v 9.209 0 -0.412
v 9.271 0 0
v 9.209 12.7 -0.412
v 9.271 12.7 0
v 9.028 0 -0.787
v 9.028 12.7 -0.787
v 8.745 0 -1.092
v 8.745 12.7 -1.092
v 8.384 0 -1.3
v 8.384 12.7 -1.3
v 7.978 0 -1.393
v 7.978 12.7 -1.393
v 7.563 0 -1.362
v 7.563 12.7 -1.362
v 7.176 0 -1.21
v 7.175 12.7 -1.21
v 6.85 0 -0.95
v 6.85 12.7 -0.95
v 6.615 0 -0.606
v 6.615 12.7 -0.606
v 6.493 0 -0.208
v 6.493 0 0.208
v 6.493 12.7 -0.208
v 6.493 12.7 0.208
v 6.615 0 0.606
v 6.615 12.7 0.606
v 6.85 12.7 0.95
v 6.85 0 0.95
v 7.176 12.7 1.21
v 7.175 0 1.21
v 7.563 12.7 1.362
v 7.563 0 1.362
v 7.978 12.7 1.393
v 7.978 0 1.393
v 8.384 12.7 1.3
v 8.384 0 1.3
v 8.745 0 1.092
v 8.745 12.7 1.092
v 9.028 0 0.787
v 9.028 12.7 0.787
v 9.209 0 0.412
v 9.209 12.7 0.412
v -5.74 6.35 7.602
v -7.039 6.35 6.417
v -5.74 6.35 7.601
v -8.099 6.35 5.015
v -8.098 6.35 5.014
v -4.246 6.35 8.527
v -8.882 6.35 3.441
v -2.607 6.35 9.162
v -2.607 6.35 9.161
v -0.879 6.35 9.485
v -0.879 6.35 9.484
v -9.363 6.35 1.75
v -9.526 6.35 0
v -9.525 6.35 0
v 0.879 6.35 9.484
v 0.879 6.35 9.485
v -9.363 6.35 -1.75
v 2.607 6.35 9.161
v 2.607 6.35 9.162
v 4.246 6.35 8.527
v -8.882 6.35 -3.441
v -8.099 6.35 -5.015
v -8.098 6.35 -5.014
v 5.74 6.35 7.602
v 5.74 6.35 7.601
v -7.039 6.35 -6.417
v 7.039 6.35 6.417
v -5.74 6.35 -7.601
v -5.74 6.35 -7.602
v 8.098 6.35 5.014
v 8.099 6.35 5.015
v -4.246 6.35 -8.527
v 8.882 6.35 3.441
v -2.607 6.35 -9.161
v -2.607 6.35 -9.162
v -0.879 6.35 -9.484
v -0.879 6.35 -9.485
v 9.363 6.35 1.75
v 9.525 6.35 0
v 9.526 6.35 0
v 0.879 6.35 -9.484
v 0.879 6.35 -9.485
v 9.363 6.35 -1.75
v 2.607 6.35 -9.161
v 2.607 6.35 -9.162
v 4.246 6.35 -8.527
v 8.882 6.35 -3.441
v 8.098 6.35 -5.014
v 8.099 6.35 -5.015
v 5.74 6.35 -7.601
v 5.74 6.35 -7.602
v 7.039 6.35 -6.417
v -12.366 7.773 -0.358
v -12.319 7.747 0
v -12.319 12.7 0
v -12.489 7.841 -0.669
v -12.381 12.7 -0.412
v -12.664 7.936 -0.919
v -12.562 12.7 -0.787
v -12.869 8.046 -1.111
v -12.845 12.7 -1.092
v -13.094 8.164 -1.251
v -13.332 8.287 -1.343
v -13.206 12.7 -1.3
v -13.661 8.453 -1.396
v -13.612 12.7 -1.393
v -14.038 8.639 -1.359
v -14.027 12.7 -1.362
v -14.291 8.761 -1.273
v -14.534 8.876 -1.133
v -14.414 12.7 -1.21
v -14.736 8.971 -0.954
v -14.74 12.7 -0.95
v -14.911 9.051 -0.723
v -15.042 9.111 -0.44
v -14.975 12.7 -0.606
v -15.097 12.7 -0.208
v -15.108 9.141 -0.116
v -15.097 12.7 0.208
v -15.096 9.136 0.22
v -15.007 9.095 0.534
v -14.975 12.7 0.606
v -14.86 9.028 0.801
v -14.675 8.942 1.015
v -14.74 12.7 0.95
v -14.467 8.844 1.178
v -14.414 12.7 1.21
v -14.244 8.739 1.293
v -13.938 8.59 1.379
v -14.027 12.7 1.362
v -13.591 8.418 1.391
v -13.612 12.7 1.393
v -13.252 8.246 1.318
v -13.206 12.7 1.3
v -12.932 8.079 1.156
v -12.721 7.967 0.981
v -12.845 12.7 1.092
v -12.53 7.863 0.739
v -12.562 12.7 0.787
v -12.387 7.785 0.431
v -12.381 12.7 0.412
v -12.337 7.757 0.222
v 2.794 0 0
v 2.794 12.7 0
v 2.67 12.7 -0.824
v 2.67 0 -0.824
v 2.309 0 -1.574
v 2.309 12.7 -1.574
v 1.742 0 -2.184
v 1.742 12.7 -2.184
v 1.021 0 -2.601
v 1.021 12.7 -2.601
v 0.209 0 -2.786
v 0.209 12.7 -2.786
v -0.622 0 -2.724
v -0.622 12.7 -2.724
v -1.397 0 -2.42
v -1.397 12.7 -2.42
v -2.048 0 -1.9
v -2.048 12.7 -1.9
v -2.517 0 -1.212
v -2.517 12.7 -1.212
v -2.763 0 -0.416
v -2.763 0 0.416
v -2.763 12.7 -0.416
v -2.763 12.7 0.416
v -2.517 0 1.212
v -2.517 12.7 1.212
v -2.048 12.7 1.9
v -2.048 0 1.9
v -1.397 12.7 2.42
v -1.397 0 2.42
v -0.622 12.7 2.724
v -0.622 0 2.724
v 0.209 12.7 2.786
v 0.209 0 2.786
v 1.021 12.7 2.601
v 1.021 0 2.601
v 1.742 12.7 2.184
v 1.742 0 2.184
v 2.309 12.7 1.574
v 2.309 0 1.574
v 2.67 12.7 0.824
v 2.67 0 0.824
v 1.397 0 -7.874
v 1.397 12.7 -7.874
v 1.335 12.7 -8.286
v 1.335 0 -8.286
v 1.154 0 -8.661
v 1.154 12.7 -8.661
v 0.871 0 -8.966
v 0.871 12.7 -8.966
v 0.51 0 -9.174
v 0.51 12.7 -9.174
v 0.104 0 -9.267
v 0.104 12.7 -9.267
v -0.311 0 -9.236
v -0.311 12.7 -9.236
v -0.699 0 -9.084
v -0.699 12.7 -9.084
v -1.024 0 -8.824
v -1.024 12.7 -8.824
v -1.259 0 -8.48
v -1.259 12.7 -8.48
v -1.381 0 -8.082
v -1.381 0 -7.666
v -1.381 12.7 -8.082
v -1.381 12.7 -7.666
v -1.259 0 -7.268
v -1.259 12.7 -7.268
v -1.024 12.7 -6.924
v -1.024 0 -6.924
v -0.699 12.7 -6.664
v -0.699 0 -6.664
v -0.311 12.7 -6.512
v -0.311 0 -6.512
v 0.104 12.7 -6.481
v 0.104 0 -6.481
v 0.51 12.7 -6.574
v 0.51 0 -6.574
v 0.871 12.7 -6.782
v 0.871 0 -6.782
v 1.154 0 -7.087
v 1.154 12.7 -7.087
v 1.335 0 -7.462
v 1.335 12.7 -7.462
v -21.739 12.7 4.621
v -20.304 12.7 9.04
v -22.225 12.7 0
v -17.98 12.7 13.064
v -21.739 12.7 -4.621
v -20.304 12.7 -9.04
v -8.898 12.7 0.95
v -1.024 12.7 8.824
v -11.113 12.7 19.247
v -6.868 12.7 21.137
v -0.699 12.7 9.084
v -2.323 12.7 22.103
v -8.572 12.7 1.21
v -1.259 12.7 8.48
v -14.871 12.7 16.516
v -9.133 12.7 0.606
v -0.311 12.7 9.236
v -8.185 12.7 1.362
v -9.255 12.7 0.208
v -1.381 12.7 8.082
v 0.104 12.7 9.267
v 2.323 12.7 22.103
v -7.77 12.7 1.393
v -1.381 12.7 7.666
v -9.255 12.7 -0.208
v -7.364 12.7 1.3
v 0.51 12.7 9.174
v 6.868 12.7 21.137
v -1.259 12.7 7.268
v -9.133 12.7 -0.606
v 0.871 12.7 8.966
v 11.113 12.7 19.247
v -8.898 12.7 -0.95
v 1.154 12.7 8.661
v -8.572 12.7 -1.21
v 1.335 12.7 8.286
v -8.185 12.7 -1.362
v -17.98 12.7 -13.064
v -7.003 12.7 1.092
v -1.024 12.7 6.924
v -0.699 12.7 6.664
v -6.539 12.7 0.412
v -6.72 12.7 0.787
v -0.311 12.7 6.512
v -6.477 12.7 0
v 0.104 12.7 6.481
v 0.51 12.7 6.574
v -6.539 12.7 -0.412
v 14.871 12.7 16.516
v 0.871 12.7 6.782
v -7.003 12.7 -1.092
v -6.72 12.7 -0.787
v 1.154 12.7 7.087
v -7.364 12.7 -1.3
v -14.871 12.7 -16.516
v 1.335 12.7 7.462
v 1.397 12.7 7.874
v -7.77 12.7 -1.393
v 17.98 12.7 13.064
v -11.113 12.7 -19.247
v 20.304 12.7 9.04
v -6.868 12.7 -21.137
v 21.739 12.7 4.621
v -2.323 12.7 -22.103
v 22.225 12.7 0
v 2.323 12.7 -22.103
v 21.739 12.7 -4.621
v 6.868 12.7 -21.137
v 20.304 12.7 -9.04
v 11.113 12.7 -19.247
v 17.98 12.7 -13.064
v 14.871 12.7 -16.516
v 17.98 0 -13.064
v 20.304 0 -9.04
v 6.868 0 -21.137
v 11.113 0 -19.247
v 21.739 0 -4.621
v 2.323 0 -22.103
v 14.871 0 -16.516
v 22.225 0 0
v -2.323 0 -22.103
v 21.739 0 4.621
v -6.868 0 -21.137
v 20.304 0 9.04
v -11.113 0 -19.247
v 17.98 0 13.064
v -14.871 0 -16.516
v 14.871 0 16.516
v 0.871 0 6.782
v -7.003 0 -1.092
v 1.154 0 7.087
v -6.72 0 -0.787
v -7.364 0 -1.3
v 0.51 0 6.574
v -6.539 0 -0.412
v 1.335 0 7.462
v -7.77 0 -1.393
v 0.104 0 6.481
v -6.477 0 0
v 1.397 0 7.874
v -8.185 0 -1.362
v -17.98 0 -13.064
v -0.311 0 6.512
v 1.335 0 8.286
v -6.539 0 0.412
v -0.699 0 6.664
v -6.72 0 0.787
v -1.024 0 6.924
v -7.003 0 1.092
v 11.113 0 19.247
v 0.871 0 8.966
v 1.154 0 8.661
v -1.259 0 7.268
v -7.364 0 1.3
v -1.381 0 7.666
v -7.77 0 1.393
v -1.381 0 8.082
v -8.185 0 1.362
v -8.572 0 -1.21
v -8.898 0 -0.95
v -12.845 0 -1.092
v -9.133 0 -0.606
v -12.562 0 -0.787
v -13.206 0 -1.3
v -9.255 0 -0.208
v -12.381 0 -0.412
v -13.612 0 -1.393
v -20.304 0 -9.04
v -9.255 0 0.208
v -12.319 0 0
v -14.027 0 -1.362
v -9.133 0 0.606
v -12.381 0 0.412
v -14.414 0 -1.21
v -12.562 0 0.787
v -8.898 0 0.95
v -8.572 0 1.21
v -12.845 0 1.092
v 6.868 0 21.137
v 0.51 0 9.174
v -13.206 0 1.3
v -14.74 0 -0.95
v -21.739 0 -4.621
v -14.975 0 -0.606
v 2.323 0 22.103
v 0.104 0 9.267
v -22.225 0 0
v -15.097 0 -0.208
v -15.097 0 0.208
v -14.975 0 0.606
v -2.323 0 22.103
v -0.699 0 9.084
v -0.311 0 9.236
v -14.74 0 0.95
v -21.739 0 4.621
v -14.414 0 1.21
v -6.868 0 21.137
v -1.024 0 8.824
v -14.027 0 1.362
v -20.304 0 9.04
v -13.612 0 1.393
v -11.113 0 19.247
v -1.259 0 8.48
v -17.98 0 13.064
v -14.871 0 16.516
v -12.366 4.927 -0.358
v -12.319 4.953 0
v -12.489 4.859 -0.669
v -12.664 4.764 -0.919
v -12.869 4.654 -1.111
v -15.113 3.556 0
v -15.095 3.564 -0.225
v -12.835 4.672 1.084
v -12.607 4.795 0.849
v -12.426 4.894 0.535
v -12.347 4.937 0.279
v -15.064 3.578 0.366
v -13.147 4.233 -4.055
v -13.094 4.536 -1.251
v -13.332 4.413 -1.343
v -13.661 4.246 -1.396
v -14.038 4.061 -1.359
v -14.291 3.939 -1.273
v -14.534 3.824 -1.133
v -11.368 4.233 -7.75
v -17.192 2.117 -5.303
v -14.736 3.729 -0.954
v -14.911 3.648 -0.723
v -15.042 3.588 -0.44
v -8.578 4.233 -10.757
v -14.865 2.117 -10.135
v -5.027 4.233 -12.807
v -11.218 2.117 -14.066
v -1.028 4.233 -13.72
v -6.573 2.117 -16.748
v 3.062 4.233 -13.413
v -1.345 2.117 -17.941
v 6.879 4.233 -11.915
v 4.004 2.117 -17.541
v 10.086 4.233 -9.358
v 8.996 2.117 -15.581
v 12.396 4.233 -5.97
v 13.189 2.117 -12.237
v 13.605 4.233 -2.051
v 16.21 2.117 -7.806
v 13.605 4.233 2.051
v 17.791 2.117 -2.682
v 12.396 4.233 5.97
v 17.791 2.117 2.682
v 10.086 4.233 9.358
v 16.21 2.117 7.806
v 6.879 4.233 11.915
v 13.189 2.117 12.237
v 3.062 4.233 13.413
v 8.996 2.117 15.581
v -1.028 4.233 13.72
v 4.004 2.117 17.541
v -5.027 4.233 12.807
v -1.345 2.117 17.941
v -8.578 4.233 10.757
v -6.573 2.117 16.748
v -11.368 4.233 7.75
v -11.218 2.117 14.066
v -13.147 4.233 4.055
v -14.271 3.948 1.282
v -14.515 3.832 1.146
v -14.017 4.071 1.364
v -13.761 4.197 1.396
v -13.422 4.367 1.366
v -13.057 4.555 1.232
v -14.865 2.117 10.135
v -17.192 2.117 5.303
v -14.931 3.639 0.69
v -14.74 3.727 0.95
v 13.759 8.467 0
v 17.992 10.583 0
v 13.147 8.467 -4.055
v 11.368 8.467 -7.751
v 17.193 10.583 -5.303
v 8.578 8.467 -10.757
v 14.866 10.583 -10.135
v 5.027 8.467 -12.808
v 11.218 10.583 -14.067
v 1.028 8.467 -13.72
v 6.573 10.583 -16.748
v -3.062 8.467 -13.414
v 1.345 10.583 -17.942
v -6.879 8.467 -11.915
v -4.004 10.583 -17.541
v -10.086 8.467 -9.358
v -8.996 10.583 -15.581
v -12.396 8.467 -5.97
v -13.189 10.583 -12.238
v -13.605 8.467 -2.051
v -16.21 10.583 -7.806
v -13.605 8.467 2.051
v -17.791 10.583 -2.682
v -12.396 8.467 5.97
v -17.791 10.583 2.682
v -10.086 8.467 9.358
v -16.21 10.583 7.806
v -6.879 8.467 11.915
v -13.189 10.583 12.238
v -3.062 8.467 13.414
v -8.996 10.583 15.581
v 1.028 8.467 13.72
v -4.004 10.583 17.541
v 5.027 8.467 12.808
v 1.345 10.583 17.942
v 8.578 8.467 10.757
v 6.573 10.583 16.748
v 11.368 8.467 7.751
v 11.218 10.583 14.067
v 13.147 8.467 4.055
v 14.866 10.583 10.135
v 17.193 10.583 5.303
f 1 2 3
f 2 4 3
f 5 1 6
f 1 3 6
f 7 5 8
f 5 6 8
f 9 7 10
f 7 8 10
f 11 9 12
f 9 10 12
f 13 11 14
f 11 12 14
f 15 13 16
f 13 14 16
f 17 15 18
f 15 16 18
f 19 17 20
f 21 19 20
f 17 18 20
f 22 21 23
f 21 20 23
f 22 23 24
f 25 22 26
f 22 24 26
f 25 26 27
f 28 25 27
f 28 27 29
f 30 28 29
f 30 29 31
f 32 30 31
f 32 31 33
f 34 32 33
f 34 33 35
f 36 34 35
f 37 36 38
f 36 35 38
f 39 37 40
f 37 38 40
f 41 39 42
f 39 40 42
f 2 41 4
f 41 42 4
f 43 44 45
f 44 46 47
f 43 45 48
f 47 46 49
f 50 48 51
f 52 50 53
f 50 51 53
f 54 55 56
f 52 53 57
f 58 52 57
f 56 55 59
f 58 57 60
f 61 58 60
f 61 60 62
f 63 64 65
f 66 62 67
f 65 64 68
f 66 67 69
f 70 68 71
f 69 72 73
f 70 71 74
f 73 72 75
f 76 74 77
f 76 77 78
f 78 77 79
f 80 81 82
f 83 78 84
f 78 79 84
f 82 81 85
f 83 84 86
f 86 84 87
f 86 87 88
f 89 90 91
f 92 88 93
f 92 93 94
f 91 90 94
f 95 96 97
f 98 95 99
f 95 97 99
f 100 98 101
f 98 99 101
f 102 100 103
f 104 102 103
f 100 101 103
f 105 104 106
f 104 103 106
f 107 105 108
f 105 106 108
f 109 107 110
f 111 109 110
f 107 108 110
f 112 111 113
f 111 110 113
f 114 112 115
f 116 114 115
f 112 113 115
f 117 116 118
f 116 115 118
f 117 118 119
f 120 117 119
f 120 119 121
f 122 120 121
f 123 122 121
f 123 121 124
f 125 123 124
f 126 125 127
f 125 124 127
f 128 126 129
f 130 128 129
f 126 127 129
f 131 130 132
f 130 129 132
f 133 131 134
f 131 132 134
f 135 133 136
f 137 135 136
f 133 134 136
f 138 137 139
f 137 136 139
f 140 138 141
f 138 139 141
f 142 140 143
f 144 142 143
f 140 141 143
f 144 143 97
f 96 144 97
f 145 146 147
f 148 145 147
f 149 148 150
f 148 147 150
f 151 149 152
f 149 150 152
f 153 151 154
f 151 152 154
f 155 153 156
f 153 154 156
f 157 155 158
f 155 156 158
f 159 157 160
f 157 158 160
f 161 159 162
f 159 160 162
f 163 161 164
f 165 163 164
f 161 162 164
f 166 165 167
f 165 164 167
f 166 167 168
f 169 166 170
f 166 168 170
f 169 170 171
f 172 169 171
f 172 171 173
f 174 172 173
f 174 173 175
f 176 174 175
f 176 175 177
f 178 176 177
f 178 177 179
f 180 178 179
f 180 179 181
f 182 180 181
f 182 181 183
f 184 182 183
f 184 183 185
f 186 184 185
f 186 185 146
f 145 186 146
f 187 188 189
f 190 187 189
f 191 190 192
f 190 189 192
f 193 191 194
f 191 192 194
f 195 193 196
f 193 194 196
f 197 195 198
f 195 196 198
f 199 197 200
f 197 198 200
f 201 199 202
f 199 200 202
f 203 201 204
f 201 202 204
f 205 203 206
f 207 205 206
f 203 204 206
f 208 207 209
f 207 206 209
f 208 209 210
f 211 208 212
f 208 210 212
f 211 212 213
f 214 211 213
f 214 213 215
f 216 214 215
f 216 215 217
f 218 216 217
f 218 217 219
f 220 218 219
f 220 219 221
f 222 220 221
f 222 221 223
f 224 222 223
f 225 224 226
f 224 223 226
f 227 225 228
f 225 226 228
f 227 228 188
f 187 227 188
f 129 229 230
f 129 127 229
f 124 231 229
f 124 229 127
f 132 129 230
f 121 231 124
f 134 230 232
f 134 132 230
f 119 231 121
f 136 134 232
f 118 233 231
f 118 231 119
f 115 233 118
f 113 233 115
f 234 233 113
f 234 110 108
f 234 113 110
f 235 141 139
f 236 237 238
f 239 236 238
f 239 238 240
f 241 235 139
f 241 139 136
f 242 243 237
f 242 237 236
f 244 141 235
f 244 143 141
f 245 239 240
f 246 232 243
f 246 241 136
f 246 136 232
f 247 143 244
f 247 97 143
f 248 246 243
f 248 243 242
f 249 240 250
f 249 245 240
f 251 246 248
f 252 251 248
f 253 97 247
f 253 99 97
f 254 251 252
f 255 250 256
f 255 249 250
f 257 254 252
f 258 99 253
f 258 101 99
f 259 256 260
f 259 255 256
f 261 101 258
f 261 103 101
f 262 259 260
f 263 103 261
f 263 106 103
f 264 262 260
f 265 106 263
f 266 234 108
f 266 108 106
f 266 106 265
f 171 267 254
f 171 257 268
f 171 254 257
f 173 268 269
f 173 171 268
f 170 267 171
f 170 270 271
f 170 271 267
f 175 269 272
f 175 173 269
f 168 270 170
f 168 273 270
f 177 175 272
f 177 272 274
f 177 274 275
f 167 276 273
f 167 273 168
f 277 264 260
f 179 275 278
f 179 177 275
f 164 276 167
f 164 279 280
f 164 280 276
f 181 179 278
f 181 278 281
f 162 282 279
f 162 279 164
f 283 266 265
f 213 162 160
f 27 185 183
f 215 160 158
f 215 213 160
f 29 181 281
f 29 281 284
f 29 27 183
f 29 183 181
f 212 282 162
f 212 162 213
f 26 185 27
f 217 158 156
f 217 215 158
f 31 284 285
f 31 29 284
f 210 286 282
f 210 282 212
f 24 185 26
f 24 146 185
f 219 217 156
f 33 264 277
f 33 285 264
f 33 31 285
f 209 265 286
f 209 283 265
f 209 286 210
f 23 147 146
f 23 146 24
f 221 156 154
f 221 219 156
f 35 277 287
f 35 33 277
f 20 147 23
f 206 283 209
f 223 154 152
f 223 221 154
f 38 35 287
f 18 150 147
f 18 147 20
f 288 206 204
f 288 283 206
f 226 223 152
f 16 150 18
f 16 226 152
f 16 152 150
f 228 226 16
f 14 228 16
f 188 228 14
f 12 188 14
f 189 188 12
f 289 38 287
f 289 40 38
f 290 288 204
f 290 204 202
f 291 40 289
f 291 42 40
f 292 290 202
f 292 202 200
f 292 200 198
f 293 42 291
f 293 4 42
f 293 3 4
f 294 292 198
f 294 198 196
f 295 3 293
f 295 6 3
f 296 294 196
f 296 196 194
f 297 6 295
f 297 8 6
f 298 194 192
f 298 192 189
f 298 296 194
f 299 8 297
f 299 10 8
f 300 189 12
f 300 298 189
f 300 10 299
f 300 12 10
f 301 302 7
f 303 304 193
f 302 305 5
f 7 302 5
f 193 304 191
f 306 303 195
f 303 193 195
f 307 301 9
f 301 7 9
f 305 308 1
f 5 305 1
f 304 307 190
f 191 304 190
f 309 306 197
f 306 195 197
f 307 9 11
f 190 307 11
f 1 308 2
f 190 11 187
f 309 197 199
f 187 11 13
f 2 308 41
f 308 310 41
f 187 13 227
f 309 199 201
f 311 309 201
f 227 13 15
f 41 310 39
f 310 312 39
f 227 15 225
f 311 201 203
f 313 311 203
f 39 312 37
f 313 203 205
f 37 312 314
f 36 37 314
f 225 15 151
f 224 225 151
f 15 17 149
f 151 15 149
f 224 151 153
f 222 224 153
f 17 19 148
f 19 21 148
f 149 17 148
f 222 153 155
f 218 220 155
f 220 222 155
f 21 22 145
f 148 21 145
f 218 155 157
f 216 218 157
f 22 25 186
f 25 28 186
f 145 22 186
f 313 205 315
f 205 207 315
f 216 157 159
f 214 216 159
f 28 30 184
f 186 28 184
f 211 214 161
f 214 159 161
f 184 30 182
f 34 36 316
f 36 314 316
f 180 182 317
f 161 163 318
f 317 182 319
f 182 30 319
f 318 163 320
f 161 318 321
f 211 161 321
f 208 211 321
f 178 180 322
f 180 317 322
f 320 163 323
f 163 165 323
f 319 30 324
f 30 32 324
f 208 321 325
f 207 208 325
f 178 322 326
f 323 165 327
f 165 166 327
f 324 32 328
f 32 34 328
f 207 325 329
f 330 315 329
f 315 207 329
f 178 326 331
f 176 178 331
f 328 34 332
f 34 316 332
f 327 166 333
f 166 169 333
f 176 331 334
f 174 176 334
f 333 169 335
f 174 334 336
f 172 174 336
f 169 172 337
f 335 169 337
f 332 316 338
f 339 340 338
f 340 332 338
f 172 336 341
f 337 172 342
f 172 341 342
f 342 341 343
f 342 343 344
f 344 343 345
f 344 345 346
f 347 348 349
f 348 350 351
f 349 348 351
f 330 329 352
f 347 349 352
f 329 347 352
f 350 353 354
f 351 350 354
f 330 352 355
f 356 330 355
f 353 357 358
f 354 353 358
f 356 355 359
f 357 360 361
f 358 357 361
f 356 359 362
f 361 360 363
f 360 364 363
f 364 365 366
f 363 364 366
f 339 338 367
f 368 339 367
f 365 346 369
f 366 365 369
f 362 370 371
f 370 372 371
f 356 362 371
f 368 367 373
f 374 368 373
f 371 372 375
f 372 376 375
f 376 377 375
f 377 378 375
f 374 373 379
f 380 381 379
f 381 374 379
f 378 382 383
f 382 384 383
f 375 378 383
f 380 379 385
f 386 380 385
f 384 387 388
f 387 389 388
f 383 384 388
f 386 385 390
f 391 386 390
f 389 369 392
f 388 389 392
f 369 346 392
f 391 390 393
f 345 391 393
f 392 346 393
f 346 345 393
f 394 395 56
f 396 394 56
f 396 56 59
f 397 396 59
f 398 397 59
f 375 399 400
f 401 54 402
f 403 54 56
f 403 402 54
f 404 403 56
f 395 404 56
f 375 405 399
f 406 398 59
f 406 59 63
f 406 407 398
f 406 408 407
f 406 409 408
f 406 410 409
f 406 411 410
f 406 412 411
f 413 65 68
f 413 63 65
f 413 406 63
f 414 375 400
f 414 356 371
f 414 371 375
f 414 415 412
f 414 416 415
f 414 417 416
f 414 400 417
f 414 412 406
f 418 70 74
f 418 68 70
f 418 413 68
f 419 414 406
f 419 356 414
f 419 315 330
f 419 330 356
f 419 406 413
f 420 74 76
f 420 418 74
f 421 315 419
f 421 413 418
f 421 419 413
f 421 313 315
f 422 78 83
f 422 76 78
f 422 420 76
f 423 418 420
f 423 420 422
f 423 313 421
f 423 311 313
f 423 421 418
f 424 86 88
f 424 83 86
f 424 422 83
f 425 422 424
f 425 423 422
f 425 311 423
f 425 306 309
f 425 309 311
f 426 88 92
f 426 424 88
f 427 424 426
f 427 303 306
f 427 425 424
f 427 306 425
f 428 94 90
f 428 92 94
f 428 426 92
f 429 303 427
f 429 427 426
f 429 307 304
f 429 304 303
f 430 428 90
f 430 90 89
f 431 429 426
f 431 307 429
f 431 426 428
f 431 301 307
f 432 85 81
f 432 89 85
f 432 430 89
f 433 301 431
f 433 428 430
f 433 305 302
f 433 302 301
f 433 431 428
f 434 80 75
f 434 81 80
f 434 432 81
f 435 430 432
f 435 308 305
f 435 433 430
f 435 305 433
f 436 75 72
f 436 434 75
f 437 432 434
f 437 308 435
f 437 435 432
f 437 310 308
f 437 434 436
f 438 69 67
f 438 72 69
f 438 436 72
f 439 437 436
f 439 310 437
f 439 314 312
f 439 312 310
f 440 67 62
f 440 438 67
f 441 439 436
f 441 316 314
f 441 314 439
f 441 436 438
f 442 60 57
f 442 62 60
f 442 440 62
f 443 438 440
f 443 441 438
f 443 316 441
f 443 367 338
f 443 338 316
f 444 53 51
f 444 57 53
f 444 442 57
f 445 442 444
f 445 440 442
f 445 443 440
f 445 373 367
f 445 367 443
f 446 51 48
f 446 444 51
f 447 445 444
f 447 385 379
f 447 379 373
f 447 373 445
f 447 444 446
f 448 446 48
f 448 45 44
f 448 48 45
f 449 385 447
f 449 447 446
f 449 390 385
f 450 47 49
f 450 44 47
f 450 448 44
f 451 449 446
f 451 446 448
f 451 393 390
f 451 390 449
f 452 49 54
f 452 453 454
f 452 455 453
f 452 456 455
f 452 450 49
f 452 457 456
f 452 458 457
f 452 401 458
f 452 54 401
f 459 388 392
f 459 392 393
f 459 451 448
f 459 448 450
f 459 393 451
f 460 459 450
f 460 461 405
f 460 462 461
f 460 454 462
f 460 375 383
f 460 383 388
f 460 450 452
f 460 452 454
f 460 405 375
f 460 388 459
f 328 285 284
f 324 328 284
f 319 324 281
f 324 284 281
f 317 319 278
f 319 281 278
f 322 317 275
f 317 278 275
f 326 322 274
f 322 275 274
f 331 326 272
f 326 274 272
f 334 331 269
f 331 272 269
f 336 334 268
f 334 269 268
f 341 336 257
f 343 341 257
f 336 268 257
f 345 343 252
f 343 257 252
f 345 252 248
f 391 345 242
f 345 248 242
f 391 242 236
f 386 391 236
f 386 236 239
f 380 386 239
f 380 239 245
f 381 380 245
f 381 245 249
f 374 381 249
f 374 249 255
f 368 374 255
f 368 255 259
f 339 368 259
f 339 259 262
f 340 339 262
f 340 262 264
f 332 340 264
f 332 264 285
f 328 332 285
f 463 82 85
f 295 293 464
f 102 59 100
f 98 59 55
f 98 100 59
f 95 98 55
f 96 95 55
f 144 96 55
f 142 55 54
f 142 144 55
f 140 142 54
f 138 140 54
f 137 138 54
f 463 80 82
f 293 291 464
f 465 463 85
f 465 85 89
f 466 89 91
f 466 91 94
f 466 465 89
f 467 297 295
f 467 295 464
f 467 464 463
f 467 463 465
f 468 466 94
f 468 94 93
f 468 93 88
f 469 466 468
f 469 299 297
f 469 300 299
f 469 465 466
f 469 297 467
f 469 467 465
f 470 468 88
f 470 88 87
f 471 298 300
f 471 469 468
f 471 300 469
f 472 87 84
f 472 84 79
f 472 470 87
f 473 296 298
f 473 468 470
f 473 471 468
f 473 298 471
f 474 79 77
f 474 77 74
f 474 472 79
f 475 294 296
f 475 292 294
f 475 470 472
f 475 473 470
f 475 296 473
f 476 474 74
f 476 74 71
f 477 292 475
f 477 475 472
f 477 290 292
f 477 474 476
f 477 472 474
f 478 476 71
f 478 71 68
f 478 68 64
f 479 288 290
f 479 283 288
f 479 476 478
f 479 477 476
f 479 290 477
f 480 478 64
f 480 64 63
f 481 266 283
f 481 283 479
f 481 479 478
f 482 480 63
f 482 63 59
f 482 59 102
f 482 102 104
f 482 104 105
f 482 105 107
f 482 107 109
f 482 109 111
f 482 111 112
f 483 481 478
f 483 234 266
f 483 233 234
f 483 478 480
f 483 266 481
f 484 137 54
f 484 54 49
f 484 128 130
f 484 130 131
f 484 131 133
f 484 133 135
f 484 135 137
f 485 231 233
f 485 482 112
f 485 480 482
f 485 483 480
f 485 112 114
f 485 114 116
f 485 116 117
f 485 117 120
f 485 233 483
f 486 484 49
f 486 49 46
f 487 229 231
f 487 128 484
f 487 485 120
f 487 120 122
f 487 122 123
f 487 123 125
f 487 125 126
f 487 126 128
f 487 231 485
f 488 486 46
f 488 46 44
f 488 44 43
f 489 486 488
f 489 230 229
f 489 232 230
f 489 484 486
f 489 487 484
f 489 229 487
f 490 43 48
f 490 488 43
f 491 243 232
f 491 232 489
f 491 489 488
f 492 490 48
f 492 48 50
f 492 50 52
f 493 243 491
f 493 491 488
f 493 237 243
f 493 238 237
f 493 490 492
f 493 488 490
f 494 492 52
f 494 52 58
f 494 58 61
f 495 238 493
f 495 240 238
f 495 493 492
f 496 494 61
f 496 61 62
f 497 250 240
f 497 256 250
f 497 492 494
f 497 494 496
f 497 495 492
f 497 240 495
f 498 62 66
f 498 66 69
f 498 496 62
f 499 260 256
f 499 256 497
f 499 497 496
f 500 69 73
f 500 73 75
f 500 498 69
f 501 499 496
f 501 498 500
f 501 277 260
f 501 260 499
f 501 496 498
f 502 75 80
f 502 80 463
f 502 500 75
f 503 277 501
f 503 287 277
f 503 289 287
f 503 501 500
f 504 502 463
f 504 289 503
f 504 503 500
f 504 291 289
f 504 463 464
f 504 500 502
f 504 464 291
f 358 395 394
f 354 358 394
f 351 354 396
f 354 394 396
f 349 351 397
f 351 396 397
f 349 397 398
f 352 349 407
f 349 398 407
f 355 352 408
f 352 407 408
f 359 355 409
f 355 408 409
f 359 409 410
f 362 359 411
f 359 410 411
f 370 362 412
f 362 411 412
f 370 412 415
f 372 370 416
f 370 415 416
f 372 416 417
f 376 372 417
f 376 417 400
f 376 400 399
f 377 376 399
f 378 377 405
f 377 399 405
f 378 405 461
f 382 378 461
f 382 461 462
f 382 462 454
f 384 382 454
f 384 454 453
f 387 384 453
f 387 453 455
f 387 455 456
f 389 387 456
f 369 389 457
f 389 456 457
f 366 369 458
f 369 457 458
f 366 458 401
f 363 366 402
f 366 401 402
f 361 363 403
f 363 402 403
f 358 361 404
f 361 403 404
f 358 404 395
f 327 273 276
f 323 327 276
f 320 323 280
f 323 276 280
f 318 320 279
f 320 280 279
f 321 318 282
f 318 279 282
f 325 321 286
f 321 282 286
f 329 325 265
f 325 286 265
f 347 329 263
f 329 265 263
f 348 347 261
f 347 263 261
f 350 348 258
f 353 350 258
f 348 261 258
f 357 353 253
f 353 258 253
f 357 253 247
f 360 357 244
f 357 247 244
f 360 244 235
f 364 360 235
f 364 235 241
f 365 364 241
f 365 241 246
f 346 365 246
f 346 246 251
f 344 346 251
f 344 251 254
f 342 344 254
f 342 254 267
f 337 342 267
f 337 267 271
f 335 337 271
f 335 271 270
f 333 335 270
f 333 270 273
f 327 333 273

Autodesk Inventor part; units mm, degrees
ref_plane "YZ Plane" through (0, 0, 0) normal (1, 0, 0) x (0, 1, 0)
ref_plane "XZ Plane" through (0, 0, 0) normal (0, 1, 0) x (-1, 0, 0)
ref_plane "XY Plane" through (0, 0, 0) normal (0, 0, 1) x (1, 0, 0)
sketch "Sketch1" plane through (0, 0, 0) normal (0, 1, 0) x (-1, 0, 0)
  circle A0 centre (0, 0) radius 22.225
  dimension "d0" = 44.45
extrude "Extrusion1" add sketch "Sketch1" along normal blind 6.35
chamfer "Chamfer1" distance 12.7 distance2 6.35 1 edges at (22.225, 6.35, 0) measured on face at (-2.0252, 6.35, -4.4852)
sketch "Sketch2" plane through (0, 6.35, 0) normal (0, 1, 0) x (1, 0, 0)
  circle A0 centre (0, 0) radius 22.225
  dimension "d57" = 44.45
extrude "Extrusion2" add sketch "Sketch2" along normal blind 6.35
chamfer "Chamfer2" distance 12.7 distance2 6.35 1 edges at (-22.225, 6.35, 0) measured on face at (17.7764, 6.35, 1.7729)
sketch "Sketch4" plane through (0, 12.7, 0) normal (0, 1, 0) x (1, 0, 0)
  circle A0 centre (0, 0) radius 2.794
  line L0 (0, 0) -> (-7.874, 0)
  line L1 (-7.874, 0) -> (-13.716, 0)
  line L2 (0, 0) -> (0, 7.874)
  line L3 (0, 0) -> (7.874, 0)
  line L4 (0, 0) -> (0, -7.874)
  circle A1 centre (0, -7.874) radius 1.397
  circle A2 centre (7.874, 0) radius 1.397
  circle A3 centre (0, 7.874) radius 1.397
  circle A4 centre (-7.874, 0) radius 1.397
  circle A5 centre (-13.716, 0) radius 1.397
  dimension "d28" = 5.588
  dimension "d29" = 7.874
  dimension "d30" = 5.842
  dimension "d31" = 7.874
  dimension "d32" = 7.874
  dimension "d33" = 7.874
  dimension "d34" = 2.794
  dimension "d35" = 2.794
  dimension "d36" = 2.794
  dimension "d37" = 2.794
  dimension "d38" = 2.794
extrude "Extrusion3" cut sketch "Sketch4" against normal blind 15.24
sketch "Sketch5" plane through (0, 0, 0) normal (0, -1, 0) x (1, 0, 0)
  circle A0 centre (0, 0) radius 2.794 projected
  circle A1 centre (0, 0) radius 11.1125
  dimension "d58" = 22.225
properties part number "String Little Big Wheel V5"
